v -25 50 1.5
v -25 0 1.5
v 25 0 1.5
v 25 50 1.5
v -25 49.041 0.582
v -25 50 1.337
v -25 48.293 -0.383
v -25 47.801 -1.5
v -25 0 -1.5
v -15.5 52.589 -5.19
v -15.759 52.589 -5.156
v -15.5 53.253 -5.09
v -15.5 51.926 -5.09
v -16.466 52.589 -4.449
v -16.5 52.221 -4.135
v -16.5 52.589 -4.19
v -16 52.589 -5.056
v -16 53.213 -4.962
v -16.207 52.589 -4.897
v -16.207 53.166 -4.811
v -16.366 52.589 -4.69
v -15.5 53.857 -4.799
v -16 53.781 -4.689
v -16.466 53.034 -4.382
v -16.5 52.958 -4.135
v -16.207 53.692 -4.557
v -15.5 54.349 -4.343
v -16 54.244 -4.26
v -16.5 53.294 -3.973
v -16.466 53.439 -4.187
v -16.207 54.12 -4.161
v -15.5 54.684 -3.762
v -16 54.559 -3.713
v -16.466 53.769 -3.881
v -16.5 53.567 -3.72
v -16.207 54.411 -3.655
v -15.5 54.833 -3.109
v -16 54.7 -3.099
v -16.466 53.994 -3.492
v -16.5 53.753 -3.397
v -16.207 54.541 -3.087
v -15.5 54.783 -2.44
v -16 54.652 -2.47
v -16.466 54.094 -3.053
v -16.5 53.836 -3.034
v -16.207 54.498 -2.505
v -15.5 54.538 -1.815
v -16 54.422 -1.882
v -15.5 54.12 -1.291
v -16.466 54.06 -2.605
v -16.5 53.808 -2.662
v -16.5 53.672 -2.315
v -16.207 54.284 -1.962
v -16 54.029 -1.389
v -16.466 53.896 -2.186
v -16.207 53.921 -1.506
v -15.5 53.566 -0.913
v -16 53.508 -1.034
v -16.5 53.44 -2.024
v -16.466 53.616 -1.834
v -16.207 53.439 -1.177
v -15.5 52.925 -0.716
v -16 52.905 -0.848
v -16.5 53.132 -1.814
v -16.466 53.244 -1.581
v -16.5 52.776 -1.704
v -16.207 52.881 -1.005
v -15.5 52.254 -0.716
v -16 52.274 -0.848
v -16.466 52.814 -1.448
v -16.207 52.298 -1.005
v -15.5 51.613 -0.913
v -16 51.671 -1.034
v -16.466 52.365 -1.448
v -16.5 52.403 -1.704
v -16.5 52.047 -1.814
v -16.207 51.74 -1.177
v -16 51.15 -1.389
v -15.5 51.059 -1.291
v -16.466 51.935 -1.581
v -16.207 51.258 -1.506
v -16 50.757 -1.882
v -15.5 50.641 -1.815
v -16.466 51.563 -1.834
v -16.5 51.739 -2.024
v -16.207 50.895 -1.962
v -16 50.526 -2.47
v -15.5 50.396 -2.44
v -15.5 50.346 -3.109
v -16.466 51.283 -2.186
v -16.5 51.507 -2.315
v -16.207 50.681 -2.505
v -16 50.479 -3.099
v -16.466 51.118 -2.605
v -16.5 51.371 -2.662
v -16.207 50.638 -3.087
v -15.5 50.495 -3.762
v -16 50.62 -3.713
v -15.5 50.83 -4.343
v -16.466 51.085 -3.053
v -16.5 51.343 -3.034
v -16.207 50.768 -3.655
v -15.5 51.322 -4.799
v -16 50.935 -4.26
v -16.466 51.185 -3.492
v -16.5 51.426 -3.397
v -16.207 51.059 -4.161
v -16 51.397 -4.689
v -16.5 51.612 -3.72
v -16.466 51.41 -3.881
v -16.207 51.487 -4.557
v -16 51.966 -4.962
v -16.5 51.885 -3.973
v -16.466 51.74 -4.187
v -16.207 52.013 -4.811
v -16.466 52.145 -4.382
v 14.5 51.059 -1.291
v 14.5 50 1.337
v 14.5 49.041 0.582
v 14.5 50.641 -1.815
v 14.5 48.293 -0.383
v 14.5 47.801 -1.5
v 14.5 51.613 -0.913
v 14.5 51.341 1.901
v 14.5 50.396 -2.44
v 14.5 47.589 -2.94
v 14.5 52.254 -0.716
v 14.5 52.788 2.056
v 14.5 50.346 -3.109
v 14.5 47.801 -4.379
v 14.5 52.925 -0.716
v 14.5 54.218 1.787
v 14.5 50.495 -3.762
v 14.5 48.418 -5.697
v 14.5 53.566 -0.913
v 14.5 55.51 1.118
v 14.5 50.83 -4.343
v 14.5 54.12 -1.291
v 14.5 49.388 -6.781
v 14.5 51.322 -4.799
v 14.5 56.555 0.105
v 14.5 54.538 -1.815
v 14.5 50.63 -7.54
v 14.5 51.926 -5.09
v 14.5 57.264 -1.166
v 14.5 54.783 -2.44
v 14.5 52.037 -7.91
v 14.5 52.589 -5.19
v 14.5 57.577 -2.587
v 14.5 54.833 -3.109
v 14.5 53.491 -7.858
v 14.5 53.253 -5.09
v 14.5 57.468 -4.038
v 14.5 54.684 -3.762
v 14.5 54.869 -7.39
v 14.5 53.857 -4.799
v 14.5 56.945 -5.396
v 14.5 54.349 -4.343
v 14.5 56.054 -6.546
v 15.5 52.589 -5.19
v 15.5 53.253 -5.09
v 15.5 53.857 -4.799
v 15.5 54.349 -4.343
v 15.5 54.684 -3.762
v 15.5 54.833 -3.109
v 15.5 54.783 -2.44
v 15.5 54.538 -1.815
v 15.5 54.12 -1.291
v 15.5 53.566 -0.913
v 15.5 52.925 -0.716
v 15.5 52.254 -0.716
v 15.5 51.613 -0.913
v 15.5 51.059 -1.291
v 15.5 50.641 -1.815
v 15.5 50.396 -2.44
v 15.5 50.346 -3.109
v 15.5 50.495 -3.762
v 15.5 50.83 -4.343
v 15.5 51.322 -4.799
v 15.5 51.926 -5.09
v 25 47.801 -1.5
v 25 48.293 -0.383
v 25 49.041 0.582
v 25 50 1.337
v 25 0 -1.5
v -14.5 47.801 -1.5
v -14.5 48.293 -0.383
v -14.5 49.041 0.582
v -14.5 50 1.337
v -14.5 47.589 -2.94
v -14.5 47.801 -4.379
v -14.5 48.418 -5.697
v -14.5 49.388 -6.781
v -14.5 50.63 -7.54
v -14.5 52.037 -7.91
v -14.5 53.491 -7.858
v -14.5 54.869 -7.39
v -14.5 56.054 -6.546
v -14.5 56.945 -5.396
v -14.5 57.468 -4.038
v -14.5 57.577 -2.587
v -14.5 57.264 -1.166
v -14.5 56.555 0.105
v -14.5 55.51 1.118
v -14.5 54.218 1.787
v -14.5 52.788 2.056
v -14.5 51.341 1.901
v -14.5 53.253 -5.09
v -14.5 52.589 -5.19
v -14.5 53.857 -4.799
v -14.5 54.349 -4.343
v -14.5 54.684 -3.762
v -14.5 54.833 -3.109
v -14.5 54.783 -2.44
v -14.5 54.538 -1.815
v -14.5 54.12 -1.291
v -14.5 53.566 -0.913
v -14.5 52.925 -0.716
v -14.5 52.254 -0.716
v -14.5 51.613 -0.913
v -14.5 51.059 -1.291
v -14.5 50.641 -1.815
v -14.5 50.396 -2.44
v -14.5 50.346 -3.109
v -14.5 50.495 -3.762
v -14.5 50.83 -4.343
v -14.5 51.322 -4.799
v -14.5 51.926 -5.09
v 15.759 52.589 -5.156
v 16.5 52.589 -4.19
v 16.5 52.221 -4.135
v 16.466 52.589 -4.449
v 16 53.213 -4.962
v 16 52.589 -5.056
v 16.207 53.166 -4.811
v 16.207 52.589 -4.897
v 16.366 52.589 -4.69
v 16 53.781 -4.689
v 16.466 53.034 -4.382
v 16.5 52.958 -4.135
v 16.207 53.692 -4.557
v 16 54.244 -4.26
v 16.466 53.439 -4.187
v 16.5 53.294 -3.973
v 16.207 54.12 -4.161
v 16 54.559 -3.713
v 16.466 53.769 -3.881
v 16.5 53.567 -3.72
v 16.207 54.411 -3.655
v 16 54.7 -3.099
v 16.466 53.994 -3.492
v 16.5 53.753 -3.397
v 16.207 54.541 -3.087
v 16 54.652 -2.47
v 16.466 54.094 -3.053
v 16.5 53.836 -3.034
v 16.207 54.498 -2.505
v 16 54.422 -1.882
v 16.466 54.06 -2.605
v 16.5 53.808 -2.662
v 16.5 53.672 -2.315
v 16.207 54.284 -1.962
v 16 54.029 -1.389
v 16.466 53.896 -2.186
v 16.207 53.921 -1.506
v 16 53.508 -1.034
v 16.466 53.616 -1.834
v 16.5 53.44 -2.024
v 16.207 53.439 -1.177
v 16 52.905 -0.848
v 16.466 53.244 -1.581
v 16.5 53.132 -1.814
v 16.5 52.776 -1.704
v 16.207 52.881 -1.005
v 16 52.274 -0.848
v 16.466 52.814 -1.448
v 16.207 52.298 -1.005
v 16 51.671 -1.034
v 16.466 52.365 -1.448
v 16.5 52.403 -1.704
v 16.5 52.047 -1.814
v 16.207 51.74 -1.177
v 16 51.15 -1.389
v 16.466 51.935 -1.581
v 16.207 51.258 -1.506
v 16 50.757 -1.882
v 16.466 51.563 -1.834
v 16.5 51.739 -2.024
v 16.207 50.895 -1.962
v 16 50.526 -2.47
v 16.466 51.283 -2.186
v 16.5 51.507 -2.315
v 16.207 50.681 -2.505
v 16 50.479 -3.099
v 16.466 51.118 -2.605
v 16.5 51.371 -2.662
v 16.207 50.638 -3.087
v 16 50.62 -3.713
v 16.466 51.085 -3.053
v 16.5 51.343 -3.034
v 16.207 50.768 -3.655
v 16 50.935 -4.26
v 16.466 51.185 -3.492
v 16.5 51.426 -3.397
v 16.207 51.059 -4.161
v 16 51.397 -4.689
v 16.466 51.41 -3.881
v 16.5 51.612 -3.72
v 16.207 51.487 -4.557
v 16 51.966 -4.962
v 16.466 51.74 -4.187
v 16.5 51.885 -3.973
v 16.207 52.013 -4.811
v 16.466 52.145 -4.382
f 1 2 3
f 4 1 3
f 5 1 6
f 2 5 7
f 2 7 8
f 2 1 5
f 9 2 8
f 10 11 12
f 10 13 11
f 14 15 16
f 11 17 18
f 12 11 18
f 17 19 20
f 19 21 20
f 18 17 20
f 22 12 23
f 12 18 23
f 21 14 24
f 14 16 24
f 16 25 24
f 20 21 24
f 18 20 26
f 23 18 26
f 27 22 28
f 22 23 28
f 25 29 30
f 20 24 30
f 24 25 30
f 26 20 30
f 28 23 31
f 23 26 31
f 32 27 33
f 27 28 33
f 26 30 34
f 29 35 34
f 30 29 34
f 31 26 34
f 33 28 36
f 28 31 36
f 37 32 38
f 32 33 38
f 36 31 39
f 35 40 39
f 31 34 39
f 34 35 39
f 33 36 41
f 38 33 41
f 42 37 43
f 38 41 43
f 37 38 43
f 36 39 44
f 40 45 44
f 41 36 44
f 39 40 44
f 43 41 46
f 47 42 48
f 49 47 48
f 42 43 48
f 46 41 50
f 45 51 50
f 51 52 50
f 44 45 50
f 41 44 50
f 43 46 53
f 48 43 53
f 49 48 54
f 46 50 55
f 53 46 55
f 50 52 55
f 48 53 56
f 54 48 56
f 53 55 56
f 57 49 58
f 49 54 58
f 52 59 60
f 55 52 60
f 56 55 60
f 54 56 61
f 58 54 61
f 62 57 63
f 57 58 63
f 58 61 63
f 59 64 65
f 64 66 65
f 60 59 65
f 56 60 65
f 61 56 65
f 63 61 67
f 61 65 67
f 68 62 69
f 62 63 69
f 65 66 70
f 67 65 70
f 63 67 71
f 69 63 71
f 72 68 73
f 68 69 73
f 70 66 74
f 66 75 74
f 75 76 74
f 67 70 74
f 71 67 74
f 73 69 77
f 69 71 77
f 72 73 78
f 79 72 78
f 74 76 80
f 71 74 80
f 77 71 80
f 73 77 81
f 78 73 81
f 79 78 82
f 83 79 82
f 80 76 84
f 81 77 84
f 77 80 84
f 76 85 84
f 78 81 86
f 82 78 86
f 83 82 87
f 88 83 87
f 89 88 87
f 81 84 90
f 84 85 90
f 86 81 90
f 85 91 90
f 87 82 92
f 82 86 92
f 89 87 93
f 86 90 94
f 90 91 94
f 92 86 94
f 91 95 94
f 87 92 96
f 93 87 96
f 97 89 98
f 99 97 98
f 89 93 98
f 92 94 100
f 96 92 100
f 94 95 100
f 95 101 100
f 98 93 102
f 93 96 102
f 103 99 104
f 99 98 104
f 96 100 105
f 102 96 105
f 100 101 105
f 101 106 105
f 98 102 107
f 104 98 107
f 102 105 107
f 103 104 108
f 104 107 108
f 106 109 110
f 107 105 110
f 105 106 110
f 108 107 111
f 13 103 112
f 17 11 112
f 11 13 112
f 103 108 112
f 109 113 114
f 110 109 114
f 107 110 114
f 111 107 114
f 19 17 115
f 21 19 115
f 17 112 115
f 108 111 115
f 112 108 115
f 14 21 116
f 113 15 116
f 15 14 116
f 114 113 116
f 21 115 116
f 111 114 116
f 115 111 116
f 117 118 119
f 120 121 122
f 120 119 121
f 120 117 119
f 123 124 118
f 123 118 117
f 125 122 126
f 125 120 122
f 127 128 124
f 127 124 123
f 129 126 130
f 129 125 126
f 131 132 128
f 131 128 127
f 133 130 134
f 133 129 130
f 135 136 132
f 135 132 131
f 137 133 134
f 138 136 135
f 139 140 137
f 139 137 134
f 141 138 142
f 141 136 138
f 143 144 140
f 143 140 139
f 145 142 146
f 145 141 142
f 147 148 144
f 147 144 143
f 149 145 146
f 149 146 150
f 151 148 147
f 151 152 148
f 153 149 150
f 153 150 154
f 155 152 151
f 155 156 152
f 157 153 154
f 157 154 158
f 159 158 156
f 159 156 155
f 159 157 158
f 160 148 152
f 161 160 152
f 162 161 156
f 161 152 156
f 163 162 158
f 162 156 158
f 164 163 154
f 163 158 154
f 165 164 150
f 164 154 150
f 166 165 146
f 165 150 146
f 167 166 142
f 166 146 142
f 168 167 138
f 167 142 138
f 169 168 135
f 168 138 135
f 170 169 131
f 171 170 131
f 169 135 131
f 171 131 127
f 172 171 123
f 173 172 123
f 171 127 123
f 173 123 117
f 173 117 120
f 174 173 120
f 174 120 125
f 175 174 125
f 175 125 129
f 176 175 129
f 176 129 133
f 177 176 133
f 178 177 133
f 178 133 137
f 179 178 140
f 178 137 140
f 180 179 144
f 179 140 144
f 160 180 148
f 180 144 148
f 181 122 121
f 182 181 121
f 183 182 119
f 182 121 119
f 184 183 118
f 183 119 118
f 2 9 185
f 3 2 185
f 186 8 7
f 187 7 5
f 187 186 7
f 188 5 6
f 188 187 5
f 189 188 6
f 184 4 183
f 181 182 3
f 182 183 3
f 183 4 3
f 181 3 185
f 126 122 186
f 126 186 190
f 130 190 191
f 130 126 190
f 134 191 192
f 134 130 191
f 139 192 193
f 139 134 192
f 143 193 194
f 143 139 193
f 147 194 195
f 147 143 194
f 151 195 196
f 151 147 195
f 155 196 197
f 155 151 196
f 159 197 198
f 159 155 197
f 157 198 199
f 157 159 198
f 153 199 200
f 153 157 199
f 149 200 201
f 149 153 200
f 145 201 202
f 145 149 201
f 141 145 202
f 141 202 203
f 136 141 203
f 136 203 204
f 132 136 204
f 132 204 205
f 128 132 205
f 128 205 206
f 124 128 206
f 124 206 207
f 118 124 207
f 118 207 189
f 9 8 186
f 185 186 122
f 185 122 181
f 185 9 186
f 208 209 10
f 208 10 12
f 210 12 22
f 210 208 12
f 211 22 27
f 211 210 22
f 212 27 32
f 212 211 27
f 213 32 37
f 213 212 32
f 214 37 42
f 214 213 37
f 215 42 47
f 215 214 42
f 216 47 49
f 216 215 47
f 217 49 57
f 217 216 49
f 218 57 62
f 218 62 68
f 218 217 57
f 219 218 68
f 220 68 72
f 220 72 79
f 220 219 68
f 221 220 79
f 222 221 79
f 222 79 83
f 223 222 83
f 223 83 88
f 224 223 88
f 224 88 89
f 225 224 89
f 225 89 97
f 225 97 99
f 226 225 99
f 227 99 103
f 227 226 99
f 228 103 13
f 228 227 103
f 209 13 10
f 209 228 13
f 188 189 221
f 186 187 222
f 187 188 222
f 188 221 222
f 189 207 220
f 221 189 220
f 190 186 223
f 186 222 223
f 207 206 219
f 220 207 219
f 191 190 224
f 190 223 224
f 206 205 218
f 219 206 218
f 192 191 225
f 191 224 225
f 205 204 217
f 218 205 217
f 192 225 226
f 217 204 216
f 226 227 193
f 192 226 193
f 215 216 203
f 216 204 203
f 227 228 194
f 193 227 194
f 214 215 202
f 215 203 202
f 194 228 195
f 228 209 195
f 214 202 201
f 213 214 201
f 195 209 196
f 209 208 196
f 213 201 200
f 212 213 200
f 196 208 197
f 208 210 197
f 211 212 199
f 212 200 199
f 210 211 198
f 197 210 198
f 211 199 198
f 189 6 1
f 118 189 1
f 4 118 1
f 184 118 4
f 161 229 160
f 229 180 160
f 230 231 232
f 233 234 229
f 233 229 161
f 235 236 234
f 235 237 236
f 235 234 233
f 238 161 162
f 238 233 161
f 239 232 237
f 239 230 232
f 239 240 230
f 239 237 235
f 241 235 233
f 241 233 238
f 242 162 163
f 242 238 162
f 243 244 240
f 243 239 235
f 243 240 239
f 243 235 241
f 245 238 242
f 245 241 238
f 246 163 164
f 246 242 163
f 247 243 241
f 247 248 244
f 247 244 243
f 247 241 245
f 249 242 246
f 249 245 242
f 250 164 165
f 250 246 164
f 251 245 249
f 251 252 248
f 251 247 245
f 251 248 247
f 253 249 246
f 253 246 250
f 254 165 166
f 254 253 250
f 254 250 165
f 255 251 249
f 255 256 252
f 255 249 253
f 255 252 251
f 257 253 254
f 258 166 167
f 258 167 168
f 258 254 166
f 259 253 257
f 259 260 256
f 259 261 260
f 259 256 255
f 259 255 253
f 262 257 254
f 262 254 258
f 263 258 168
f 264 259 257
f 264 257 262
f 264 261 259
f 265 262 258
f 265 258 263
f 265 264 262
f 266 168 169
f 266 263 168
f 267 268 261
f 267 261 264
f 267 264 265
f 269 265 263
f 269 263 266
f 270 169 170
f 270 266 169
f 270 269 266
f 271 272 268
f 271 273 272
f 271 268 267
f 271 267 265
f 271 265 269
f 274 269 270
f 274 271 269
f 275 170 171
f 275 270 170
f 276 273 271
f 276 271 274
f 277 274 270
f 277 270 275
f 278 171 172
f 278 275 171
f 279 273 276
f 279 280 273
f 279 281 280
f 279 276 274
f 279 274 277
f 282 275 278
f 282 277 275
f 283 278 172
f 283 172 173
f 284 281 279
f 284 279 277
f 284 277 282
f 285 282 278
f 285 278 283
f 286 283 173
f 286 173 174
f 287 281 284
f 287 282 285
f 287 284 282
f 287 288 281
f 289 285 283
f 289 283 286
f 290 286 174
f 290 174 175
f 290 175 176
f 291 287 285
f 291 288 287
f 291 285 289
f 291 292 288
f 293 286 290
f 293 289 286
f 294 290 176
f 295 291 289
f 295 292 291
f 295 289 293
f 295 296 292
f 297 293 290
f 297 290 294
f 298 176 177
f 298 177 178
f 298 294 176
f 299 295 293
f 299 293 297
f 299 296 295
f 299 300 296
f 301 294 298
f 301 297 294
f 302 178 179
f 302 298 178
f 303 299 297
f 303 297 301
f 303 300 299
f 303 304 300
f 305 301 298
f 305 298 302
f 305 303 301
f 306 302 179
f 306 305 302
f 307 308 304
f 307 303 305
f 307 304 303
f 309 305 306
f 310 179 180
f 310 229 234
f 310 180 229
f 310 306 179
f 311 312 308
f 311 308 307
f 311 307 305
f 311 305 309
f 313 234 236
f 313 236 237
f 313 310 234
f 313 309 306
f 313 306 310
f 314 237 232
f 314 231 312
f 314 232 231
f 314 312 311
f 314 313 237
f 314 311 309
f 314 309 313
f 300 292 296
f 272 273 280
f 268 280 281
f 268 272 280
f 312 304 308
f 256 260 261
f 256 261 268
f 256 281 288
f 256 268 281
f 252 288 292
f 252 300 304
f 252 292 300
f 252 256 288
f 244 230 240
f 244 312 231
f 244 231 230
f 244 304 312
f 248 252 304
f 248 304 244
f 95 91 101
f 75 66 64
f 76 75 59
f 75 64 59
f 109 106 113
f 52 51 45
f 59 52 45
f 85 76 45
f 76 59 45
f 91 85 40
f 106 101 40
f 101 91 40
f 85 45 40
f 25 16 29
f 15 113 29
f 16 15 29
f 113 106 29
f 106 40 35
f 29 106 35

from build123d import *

# Parameters (mm, degrees)
SKETCH1_W                = 50
SKETCH1_H                = 3
BOSS_EXTRUDE1_DEPTH      = 50
SKETCH2_R                = 5
BOSS_EXTRUDE2_DEPTH      = 14.5
BOSS_EXTRUDE2_DEPTH_BACK = 14.5
SKETCH3_R                = 2.25
BOSS_EXTRUDE3_DEPTH      = 2
FILLET2_R                = 1
FILLET2_OF_MIRROR1_R     = 1
CUT_EXTRUDE1_DEPTH       = 11.5


with BuildPart() as part:
    # Sketch1 → Boss-Extrude1 (new body)
    with BuildSketch(Plane(origin=(0, 0, 0), x_dir=(1, 0, 0), z_dir=(0, 1, 0))):
        Rectangle(SKETCH1_W, SKETCH1_H)
    extrude(amount=BOSS_EXTRUDE1_DEPTH)

    # Sketch2 → Boss-Extrude2 (add, two sides)
    with BuildSketch(Plane(origin=(0, 0, 0), x_dir=(0, 0, -1), z_dir=(1, 0, 0))) as boss_extrude2_sk:
        with Locations((2.940369627, 52.589467232)):
            Circle(SKETCH2_R)
    extrude(amount=BOSS_EXTRUDE2_DEPTH)
    extrude(boss_extrude2_sk.sketch, amount=-BOSS_EXTRUDE2_DEPTH_BACK)

    # Sketch3 → Boss-Extrude3 (add)
    with BuildSketch(Plane(origin=(14.5, 0, 0), x_dir=(0, 0, -1), z_dir=(1, 0, 0))):
        with Locations((2.940369627, 52.589467232)):
            Circle(SKETCH3_R)
    boss_extrude3 = extrude(amount=BOSS_EXTRUDE3_DEPTH)

    # Fillet2
    fillet2_edges = [part.edges().sort_by_distance(p)[0] for p in [
        (16.5, 52.589467232, -0.690369627),
    ]]
    fillet(fillet2_edges, radius=FILLET2_R)

    # Mirror1: Boss-Extrude3 across plane
    add(boss_extrude3.mirror(Plane(origin=(0, 0, 0), x_dir=(0, 0, 1), z_dir=(1, 0, 0))))

    # Fillet2 of Mirror1
    fillet2_of_mirror1_edges = [part.edges().sort_by_distance(p)[0] for p in [
        (-16.5, 52.589467232, -0.690369627),
    ]]
    fillet(fillet2_of_mirror1_edges, radius=FILLET2_OF_MIRROR1_R)

    # Sketch4 → Cut-Extrude1 (cut, through all)
    with BuildSketch(Plane(origin=(14.5, 0, 0), x_dir=(0, 0, -1), z_dir=(1, 0, 0))):
        with BuildLine():
            Line((1.5, 50), (1.5, 47.801426366))
            ThreePointArc((1.5, 47.801426366), (-0.122497577, 48.637398851), (-1.336856045, 50))
            Line((-1.336856045, 50), (1.5, 50))
        make_face()
    cut_extrude1 = extrude(amount=CUT_EXTRUDE1_DEPTH, mode=Mode.SUBTRACT)

    # Mirror2: Cut-Extrude1 across plane
    add(cut_extrude1.mirror(Plane(origin=(0, 0, 0), x_dir=(0, 0, 1), z_dir=(1, 0, 0))), mode=Mode.SUBTRACT)


solid = part.part
